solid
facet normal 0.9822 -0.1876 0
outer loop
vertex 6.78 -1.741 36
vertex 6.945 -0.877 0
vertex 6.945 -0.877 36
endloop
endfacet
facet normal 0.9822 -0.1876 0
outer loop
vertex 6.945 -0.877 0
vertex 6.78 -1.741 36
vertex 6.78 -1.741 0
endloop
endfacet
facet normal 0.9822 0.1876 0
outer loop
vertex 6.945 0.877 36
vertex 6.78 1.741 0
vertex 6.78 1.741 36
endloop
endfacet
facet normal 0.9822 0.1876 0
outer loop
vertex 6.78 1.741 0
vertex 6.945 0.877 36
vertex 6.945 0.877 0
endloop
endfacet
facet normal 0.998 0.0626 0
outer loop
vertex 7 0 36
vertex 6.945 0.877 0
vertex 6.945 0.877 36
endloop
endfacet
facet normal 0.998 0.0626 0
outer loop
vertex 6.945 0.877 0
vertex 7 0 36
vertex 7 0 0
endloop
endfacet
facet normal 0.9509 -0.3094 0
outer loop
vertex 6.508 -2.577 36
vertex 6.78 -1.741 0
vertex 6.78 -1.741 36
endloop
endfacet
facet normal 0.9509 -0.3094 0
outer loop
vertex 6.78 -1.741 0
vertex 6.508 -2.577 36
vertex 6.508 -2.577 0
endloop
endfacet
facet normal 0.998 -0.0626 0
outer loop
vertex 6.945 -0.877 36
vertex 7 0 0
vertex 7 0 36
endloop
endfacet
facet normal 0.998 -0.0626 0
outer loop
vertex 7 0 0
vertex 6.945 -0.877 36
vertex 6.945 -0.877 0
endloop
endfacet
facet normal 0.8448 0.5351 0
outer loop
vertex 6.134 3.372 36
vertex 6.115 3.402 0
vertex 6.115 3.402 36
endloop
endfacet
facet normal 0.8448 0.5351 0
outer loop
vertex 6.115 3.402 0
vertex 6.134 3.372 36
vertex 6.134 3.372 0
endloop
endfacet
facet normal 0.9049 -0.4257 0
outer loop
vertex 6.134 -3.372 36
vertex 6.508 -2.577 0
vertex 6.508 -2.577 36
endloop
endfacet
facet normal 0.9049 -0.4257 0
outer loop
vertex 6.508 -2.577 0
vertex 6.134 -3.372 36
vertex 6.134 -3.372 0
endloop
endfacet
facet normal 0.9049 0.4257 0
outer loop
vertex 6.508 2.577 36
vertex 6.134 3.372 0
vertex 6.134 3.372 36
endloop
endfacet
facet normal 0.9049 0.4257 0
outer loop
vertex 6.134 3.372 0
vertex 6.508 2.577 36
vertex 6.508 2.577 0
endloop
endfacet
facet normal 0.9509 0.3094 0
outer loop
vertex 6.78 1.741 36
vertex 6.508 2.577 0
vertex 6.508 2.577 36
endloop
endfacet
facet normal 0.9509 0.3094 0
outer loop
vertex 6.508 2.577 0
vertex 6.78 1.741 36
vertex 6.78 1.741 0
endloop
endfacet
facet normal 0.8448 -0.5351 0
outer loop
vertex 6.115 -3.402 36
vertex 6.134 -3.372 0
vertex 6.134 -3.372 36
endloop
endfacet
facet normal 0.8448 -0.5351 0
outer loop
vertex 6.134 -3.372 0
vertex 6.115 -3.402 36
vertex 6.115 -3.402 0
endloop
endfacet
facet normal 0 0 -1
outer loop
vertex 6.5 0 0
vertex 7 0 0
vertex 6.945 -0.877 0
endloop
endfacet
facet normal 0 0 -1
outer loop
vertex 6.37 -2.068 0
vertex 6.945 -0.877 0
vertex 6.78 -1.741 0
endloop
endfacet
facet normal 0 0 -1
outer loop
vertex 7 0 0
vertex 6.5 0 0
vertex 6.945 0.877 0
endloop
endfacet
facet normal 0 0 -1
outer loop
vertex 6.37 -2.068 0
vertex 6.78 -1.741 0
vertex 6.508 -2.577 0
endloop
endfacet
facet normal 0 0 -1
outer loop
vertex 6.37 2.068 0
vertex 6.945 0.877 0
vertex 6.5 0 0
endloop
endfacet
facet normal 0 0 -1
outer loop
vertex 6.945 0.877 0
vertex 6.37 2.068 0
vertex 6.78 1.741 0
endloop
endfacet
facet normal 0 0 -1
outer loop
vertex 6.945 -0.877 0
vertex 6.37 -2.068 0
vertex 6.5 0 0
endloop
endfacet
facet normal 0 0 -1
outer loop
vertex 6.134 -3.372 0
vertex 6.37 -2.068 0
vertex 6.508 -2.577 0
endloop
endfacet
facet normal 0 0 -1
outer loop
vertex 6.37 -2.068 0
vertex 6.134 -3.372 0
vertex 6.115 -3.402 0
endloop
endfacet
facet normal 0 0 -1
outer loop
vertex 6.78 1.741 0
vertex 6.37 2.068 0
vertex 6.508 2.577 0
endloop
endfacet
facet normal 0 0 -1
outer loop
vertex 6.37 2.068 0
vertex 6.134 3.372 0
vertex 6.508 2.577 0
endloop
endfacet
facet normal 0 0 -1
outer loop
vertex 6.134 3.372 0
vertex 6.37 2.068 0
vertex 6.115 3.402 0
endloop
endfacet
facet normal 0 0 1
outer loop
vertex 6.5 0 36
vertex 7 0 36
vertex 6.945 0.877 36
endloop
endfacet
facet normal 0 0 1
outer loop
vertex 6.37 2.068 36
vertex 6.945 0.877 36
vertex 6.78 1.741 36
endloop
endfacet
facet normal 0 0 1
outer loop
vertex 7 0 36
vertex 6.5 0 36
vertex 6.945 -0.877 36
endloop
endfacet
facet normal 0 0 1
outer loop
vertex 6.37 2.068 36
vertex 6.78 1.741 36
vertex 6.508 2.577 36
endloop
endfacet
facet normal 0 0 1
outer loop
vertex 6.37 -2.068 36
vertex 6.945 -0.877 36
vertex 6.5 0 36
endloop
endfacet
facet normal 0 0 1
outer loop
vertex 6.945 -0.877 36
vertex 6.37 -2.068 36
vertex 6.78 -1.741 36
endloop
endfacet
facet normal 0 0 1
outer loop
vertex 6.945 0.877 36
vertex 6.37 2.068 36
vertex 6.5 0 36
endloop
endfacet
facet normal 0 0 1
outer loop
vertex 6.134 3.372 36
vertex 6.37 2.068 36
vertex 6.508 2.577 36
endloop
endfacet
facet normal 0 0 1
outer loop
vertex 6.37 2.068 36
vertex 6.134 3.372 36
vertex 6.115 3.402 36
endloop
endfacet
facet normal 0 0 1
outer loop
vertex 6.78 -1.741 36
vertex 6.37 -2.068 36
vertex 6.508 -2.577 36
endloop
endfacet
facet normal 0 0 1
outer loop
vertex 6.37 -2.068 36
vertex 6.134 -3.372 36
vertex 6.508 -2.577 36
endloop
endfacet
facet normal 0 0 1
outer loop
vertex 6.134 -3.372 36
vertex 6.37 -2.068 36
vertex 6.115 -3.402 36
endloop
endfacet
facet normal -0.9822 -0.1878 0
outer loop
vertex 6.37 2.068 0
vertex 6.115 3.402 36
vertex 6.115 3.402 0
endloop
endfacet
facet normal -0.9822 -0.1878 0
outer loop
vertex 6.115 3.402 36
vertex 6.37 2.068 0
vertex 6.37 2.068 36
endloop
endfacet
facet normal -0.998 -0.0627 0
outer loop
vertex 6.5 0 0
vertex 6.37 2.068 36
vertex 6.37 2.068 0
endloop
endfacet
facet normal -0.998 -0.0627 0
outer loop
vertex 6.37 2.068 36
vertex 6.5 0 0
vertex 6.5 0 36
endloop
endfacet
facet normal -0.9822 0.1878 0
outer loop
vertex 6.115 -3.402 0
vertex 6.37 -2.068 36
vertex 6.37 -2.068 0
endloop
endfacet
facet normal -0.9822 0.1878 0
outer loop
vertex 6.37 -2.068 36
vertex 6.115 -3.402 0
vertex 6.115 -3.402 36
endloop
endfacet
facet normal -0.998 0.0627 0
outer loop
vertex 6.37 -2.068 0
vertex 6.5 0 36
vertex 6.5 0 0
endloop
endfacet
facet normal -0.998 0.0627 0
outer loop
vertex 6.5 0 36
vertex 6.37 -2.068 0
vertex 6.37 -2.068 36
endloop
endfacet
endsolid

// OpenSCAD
$fn = 50;


difference() {
	union() {
		cylinder(h = 36, r = 7.0000000000);
		translate(v = [-13.0000000000, 0, 0]) {
			cylinder(h = 36, r = 7.0000000000);
		}
	}
	union() {
		cylinder(h = 36, r = 3.2500000000);
		cylinder(h = 36, r = 1.8000000000);
		cylinder(h = 36, r = 1.8000000000);
		cylinder(h = 36, r = 1.8000000000);
		translate(v = [-17.5000000000, 0, 0]) {
			hull() {
				translate(v = [-3.7500000000, 0.0000000000, 0]) {
					cylinder(h = 36, r = 10.5000000000);
				}
				translate(v = [3.7500000000, 0.0000000000, 0]) {
					cylinder(h = 36, r = 10.5000000000);
				}
				translate(v = [-3.7500000000, -0.0000000000, 0]) {
					cylinder(h = 36, r = 10.5000000000);
				}
				translate(v = [3.7500000000, -0.0000000000, 0]) {
					cylinder(h = 36, r = 10.5000000000);
				}
			}
		}
		translate(v = [-10.0000000000, 0, 0.0000000000]) {
			cylinder(h = 36, r = 16.5000000000);
		}
	}
}
